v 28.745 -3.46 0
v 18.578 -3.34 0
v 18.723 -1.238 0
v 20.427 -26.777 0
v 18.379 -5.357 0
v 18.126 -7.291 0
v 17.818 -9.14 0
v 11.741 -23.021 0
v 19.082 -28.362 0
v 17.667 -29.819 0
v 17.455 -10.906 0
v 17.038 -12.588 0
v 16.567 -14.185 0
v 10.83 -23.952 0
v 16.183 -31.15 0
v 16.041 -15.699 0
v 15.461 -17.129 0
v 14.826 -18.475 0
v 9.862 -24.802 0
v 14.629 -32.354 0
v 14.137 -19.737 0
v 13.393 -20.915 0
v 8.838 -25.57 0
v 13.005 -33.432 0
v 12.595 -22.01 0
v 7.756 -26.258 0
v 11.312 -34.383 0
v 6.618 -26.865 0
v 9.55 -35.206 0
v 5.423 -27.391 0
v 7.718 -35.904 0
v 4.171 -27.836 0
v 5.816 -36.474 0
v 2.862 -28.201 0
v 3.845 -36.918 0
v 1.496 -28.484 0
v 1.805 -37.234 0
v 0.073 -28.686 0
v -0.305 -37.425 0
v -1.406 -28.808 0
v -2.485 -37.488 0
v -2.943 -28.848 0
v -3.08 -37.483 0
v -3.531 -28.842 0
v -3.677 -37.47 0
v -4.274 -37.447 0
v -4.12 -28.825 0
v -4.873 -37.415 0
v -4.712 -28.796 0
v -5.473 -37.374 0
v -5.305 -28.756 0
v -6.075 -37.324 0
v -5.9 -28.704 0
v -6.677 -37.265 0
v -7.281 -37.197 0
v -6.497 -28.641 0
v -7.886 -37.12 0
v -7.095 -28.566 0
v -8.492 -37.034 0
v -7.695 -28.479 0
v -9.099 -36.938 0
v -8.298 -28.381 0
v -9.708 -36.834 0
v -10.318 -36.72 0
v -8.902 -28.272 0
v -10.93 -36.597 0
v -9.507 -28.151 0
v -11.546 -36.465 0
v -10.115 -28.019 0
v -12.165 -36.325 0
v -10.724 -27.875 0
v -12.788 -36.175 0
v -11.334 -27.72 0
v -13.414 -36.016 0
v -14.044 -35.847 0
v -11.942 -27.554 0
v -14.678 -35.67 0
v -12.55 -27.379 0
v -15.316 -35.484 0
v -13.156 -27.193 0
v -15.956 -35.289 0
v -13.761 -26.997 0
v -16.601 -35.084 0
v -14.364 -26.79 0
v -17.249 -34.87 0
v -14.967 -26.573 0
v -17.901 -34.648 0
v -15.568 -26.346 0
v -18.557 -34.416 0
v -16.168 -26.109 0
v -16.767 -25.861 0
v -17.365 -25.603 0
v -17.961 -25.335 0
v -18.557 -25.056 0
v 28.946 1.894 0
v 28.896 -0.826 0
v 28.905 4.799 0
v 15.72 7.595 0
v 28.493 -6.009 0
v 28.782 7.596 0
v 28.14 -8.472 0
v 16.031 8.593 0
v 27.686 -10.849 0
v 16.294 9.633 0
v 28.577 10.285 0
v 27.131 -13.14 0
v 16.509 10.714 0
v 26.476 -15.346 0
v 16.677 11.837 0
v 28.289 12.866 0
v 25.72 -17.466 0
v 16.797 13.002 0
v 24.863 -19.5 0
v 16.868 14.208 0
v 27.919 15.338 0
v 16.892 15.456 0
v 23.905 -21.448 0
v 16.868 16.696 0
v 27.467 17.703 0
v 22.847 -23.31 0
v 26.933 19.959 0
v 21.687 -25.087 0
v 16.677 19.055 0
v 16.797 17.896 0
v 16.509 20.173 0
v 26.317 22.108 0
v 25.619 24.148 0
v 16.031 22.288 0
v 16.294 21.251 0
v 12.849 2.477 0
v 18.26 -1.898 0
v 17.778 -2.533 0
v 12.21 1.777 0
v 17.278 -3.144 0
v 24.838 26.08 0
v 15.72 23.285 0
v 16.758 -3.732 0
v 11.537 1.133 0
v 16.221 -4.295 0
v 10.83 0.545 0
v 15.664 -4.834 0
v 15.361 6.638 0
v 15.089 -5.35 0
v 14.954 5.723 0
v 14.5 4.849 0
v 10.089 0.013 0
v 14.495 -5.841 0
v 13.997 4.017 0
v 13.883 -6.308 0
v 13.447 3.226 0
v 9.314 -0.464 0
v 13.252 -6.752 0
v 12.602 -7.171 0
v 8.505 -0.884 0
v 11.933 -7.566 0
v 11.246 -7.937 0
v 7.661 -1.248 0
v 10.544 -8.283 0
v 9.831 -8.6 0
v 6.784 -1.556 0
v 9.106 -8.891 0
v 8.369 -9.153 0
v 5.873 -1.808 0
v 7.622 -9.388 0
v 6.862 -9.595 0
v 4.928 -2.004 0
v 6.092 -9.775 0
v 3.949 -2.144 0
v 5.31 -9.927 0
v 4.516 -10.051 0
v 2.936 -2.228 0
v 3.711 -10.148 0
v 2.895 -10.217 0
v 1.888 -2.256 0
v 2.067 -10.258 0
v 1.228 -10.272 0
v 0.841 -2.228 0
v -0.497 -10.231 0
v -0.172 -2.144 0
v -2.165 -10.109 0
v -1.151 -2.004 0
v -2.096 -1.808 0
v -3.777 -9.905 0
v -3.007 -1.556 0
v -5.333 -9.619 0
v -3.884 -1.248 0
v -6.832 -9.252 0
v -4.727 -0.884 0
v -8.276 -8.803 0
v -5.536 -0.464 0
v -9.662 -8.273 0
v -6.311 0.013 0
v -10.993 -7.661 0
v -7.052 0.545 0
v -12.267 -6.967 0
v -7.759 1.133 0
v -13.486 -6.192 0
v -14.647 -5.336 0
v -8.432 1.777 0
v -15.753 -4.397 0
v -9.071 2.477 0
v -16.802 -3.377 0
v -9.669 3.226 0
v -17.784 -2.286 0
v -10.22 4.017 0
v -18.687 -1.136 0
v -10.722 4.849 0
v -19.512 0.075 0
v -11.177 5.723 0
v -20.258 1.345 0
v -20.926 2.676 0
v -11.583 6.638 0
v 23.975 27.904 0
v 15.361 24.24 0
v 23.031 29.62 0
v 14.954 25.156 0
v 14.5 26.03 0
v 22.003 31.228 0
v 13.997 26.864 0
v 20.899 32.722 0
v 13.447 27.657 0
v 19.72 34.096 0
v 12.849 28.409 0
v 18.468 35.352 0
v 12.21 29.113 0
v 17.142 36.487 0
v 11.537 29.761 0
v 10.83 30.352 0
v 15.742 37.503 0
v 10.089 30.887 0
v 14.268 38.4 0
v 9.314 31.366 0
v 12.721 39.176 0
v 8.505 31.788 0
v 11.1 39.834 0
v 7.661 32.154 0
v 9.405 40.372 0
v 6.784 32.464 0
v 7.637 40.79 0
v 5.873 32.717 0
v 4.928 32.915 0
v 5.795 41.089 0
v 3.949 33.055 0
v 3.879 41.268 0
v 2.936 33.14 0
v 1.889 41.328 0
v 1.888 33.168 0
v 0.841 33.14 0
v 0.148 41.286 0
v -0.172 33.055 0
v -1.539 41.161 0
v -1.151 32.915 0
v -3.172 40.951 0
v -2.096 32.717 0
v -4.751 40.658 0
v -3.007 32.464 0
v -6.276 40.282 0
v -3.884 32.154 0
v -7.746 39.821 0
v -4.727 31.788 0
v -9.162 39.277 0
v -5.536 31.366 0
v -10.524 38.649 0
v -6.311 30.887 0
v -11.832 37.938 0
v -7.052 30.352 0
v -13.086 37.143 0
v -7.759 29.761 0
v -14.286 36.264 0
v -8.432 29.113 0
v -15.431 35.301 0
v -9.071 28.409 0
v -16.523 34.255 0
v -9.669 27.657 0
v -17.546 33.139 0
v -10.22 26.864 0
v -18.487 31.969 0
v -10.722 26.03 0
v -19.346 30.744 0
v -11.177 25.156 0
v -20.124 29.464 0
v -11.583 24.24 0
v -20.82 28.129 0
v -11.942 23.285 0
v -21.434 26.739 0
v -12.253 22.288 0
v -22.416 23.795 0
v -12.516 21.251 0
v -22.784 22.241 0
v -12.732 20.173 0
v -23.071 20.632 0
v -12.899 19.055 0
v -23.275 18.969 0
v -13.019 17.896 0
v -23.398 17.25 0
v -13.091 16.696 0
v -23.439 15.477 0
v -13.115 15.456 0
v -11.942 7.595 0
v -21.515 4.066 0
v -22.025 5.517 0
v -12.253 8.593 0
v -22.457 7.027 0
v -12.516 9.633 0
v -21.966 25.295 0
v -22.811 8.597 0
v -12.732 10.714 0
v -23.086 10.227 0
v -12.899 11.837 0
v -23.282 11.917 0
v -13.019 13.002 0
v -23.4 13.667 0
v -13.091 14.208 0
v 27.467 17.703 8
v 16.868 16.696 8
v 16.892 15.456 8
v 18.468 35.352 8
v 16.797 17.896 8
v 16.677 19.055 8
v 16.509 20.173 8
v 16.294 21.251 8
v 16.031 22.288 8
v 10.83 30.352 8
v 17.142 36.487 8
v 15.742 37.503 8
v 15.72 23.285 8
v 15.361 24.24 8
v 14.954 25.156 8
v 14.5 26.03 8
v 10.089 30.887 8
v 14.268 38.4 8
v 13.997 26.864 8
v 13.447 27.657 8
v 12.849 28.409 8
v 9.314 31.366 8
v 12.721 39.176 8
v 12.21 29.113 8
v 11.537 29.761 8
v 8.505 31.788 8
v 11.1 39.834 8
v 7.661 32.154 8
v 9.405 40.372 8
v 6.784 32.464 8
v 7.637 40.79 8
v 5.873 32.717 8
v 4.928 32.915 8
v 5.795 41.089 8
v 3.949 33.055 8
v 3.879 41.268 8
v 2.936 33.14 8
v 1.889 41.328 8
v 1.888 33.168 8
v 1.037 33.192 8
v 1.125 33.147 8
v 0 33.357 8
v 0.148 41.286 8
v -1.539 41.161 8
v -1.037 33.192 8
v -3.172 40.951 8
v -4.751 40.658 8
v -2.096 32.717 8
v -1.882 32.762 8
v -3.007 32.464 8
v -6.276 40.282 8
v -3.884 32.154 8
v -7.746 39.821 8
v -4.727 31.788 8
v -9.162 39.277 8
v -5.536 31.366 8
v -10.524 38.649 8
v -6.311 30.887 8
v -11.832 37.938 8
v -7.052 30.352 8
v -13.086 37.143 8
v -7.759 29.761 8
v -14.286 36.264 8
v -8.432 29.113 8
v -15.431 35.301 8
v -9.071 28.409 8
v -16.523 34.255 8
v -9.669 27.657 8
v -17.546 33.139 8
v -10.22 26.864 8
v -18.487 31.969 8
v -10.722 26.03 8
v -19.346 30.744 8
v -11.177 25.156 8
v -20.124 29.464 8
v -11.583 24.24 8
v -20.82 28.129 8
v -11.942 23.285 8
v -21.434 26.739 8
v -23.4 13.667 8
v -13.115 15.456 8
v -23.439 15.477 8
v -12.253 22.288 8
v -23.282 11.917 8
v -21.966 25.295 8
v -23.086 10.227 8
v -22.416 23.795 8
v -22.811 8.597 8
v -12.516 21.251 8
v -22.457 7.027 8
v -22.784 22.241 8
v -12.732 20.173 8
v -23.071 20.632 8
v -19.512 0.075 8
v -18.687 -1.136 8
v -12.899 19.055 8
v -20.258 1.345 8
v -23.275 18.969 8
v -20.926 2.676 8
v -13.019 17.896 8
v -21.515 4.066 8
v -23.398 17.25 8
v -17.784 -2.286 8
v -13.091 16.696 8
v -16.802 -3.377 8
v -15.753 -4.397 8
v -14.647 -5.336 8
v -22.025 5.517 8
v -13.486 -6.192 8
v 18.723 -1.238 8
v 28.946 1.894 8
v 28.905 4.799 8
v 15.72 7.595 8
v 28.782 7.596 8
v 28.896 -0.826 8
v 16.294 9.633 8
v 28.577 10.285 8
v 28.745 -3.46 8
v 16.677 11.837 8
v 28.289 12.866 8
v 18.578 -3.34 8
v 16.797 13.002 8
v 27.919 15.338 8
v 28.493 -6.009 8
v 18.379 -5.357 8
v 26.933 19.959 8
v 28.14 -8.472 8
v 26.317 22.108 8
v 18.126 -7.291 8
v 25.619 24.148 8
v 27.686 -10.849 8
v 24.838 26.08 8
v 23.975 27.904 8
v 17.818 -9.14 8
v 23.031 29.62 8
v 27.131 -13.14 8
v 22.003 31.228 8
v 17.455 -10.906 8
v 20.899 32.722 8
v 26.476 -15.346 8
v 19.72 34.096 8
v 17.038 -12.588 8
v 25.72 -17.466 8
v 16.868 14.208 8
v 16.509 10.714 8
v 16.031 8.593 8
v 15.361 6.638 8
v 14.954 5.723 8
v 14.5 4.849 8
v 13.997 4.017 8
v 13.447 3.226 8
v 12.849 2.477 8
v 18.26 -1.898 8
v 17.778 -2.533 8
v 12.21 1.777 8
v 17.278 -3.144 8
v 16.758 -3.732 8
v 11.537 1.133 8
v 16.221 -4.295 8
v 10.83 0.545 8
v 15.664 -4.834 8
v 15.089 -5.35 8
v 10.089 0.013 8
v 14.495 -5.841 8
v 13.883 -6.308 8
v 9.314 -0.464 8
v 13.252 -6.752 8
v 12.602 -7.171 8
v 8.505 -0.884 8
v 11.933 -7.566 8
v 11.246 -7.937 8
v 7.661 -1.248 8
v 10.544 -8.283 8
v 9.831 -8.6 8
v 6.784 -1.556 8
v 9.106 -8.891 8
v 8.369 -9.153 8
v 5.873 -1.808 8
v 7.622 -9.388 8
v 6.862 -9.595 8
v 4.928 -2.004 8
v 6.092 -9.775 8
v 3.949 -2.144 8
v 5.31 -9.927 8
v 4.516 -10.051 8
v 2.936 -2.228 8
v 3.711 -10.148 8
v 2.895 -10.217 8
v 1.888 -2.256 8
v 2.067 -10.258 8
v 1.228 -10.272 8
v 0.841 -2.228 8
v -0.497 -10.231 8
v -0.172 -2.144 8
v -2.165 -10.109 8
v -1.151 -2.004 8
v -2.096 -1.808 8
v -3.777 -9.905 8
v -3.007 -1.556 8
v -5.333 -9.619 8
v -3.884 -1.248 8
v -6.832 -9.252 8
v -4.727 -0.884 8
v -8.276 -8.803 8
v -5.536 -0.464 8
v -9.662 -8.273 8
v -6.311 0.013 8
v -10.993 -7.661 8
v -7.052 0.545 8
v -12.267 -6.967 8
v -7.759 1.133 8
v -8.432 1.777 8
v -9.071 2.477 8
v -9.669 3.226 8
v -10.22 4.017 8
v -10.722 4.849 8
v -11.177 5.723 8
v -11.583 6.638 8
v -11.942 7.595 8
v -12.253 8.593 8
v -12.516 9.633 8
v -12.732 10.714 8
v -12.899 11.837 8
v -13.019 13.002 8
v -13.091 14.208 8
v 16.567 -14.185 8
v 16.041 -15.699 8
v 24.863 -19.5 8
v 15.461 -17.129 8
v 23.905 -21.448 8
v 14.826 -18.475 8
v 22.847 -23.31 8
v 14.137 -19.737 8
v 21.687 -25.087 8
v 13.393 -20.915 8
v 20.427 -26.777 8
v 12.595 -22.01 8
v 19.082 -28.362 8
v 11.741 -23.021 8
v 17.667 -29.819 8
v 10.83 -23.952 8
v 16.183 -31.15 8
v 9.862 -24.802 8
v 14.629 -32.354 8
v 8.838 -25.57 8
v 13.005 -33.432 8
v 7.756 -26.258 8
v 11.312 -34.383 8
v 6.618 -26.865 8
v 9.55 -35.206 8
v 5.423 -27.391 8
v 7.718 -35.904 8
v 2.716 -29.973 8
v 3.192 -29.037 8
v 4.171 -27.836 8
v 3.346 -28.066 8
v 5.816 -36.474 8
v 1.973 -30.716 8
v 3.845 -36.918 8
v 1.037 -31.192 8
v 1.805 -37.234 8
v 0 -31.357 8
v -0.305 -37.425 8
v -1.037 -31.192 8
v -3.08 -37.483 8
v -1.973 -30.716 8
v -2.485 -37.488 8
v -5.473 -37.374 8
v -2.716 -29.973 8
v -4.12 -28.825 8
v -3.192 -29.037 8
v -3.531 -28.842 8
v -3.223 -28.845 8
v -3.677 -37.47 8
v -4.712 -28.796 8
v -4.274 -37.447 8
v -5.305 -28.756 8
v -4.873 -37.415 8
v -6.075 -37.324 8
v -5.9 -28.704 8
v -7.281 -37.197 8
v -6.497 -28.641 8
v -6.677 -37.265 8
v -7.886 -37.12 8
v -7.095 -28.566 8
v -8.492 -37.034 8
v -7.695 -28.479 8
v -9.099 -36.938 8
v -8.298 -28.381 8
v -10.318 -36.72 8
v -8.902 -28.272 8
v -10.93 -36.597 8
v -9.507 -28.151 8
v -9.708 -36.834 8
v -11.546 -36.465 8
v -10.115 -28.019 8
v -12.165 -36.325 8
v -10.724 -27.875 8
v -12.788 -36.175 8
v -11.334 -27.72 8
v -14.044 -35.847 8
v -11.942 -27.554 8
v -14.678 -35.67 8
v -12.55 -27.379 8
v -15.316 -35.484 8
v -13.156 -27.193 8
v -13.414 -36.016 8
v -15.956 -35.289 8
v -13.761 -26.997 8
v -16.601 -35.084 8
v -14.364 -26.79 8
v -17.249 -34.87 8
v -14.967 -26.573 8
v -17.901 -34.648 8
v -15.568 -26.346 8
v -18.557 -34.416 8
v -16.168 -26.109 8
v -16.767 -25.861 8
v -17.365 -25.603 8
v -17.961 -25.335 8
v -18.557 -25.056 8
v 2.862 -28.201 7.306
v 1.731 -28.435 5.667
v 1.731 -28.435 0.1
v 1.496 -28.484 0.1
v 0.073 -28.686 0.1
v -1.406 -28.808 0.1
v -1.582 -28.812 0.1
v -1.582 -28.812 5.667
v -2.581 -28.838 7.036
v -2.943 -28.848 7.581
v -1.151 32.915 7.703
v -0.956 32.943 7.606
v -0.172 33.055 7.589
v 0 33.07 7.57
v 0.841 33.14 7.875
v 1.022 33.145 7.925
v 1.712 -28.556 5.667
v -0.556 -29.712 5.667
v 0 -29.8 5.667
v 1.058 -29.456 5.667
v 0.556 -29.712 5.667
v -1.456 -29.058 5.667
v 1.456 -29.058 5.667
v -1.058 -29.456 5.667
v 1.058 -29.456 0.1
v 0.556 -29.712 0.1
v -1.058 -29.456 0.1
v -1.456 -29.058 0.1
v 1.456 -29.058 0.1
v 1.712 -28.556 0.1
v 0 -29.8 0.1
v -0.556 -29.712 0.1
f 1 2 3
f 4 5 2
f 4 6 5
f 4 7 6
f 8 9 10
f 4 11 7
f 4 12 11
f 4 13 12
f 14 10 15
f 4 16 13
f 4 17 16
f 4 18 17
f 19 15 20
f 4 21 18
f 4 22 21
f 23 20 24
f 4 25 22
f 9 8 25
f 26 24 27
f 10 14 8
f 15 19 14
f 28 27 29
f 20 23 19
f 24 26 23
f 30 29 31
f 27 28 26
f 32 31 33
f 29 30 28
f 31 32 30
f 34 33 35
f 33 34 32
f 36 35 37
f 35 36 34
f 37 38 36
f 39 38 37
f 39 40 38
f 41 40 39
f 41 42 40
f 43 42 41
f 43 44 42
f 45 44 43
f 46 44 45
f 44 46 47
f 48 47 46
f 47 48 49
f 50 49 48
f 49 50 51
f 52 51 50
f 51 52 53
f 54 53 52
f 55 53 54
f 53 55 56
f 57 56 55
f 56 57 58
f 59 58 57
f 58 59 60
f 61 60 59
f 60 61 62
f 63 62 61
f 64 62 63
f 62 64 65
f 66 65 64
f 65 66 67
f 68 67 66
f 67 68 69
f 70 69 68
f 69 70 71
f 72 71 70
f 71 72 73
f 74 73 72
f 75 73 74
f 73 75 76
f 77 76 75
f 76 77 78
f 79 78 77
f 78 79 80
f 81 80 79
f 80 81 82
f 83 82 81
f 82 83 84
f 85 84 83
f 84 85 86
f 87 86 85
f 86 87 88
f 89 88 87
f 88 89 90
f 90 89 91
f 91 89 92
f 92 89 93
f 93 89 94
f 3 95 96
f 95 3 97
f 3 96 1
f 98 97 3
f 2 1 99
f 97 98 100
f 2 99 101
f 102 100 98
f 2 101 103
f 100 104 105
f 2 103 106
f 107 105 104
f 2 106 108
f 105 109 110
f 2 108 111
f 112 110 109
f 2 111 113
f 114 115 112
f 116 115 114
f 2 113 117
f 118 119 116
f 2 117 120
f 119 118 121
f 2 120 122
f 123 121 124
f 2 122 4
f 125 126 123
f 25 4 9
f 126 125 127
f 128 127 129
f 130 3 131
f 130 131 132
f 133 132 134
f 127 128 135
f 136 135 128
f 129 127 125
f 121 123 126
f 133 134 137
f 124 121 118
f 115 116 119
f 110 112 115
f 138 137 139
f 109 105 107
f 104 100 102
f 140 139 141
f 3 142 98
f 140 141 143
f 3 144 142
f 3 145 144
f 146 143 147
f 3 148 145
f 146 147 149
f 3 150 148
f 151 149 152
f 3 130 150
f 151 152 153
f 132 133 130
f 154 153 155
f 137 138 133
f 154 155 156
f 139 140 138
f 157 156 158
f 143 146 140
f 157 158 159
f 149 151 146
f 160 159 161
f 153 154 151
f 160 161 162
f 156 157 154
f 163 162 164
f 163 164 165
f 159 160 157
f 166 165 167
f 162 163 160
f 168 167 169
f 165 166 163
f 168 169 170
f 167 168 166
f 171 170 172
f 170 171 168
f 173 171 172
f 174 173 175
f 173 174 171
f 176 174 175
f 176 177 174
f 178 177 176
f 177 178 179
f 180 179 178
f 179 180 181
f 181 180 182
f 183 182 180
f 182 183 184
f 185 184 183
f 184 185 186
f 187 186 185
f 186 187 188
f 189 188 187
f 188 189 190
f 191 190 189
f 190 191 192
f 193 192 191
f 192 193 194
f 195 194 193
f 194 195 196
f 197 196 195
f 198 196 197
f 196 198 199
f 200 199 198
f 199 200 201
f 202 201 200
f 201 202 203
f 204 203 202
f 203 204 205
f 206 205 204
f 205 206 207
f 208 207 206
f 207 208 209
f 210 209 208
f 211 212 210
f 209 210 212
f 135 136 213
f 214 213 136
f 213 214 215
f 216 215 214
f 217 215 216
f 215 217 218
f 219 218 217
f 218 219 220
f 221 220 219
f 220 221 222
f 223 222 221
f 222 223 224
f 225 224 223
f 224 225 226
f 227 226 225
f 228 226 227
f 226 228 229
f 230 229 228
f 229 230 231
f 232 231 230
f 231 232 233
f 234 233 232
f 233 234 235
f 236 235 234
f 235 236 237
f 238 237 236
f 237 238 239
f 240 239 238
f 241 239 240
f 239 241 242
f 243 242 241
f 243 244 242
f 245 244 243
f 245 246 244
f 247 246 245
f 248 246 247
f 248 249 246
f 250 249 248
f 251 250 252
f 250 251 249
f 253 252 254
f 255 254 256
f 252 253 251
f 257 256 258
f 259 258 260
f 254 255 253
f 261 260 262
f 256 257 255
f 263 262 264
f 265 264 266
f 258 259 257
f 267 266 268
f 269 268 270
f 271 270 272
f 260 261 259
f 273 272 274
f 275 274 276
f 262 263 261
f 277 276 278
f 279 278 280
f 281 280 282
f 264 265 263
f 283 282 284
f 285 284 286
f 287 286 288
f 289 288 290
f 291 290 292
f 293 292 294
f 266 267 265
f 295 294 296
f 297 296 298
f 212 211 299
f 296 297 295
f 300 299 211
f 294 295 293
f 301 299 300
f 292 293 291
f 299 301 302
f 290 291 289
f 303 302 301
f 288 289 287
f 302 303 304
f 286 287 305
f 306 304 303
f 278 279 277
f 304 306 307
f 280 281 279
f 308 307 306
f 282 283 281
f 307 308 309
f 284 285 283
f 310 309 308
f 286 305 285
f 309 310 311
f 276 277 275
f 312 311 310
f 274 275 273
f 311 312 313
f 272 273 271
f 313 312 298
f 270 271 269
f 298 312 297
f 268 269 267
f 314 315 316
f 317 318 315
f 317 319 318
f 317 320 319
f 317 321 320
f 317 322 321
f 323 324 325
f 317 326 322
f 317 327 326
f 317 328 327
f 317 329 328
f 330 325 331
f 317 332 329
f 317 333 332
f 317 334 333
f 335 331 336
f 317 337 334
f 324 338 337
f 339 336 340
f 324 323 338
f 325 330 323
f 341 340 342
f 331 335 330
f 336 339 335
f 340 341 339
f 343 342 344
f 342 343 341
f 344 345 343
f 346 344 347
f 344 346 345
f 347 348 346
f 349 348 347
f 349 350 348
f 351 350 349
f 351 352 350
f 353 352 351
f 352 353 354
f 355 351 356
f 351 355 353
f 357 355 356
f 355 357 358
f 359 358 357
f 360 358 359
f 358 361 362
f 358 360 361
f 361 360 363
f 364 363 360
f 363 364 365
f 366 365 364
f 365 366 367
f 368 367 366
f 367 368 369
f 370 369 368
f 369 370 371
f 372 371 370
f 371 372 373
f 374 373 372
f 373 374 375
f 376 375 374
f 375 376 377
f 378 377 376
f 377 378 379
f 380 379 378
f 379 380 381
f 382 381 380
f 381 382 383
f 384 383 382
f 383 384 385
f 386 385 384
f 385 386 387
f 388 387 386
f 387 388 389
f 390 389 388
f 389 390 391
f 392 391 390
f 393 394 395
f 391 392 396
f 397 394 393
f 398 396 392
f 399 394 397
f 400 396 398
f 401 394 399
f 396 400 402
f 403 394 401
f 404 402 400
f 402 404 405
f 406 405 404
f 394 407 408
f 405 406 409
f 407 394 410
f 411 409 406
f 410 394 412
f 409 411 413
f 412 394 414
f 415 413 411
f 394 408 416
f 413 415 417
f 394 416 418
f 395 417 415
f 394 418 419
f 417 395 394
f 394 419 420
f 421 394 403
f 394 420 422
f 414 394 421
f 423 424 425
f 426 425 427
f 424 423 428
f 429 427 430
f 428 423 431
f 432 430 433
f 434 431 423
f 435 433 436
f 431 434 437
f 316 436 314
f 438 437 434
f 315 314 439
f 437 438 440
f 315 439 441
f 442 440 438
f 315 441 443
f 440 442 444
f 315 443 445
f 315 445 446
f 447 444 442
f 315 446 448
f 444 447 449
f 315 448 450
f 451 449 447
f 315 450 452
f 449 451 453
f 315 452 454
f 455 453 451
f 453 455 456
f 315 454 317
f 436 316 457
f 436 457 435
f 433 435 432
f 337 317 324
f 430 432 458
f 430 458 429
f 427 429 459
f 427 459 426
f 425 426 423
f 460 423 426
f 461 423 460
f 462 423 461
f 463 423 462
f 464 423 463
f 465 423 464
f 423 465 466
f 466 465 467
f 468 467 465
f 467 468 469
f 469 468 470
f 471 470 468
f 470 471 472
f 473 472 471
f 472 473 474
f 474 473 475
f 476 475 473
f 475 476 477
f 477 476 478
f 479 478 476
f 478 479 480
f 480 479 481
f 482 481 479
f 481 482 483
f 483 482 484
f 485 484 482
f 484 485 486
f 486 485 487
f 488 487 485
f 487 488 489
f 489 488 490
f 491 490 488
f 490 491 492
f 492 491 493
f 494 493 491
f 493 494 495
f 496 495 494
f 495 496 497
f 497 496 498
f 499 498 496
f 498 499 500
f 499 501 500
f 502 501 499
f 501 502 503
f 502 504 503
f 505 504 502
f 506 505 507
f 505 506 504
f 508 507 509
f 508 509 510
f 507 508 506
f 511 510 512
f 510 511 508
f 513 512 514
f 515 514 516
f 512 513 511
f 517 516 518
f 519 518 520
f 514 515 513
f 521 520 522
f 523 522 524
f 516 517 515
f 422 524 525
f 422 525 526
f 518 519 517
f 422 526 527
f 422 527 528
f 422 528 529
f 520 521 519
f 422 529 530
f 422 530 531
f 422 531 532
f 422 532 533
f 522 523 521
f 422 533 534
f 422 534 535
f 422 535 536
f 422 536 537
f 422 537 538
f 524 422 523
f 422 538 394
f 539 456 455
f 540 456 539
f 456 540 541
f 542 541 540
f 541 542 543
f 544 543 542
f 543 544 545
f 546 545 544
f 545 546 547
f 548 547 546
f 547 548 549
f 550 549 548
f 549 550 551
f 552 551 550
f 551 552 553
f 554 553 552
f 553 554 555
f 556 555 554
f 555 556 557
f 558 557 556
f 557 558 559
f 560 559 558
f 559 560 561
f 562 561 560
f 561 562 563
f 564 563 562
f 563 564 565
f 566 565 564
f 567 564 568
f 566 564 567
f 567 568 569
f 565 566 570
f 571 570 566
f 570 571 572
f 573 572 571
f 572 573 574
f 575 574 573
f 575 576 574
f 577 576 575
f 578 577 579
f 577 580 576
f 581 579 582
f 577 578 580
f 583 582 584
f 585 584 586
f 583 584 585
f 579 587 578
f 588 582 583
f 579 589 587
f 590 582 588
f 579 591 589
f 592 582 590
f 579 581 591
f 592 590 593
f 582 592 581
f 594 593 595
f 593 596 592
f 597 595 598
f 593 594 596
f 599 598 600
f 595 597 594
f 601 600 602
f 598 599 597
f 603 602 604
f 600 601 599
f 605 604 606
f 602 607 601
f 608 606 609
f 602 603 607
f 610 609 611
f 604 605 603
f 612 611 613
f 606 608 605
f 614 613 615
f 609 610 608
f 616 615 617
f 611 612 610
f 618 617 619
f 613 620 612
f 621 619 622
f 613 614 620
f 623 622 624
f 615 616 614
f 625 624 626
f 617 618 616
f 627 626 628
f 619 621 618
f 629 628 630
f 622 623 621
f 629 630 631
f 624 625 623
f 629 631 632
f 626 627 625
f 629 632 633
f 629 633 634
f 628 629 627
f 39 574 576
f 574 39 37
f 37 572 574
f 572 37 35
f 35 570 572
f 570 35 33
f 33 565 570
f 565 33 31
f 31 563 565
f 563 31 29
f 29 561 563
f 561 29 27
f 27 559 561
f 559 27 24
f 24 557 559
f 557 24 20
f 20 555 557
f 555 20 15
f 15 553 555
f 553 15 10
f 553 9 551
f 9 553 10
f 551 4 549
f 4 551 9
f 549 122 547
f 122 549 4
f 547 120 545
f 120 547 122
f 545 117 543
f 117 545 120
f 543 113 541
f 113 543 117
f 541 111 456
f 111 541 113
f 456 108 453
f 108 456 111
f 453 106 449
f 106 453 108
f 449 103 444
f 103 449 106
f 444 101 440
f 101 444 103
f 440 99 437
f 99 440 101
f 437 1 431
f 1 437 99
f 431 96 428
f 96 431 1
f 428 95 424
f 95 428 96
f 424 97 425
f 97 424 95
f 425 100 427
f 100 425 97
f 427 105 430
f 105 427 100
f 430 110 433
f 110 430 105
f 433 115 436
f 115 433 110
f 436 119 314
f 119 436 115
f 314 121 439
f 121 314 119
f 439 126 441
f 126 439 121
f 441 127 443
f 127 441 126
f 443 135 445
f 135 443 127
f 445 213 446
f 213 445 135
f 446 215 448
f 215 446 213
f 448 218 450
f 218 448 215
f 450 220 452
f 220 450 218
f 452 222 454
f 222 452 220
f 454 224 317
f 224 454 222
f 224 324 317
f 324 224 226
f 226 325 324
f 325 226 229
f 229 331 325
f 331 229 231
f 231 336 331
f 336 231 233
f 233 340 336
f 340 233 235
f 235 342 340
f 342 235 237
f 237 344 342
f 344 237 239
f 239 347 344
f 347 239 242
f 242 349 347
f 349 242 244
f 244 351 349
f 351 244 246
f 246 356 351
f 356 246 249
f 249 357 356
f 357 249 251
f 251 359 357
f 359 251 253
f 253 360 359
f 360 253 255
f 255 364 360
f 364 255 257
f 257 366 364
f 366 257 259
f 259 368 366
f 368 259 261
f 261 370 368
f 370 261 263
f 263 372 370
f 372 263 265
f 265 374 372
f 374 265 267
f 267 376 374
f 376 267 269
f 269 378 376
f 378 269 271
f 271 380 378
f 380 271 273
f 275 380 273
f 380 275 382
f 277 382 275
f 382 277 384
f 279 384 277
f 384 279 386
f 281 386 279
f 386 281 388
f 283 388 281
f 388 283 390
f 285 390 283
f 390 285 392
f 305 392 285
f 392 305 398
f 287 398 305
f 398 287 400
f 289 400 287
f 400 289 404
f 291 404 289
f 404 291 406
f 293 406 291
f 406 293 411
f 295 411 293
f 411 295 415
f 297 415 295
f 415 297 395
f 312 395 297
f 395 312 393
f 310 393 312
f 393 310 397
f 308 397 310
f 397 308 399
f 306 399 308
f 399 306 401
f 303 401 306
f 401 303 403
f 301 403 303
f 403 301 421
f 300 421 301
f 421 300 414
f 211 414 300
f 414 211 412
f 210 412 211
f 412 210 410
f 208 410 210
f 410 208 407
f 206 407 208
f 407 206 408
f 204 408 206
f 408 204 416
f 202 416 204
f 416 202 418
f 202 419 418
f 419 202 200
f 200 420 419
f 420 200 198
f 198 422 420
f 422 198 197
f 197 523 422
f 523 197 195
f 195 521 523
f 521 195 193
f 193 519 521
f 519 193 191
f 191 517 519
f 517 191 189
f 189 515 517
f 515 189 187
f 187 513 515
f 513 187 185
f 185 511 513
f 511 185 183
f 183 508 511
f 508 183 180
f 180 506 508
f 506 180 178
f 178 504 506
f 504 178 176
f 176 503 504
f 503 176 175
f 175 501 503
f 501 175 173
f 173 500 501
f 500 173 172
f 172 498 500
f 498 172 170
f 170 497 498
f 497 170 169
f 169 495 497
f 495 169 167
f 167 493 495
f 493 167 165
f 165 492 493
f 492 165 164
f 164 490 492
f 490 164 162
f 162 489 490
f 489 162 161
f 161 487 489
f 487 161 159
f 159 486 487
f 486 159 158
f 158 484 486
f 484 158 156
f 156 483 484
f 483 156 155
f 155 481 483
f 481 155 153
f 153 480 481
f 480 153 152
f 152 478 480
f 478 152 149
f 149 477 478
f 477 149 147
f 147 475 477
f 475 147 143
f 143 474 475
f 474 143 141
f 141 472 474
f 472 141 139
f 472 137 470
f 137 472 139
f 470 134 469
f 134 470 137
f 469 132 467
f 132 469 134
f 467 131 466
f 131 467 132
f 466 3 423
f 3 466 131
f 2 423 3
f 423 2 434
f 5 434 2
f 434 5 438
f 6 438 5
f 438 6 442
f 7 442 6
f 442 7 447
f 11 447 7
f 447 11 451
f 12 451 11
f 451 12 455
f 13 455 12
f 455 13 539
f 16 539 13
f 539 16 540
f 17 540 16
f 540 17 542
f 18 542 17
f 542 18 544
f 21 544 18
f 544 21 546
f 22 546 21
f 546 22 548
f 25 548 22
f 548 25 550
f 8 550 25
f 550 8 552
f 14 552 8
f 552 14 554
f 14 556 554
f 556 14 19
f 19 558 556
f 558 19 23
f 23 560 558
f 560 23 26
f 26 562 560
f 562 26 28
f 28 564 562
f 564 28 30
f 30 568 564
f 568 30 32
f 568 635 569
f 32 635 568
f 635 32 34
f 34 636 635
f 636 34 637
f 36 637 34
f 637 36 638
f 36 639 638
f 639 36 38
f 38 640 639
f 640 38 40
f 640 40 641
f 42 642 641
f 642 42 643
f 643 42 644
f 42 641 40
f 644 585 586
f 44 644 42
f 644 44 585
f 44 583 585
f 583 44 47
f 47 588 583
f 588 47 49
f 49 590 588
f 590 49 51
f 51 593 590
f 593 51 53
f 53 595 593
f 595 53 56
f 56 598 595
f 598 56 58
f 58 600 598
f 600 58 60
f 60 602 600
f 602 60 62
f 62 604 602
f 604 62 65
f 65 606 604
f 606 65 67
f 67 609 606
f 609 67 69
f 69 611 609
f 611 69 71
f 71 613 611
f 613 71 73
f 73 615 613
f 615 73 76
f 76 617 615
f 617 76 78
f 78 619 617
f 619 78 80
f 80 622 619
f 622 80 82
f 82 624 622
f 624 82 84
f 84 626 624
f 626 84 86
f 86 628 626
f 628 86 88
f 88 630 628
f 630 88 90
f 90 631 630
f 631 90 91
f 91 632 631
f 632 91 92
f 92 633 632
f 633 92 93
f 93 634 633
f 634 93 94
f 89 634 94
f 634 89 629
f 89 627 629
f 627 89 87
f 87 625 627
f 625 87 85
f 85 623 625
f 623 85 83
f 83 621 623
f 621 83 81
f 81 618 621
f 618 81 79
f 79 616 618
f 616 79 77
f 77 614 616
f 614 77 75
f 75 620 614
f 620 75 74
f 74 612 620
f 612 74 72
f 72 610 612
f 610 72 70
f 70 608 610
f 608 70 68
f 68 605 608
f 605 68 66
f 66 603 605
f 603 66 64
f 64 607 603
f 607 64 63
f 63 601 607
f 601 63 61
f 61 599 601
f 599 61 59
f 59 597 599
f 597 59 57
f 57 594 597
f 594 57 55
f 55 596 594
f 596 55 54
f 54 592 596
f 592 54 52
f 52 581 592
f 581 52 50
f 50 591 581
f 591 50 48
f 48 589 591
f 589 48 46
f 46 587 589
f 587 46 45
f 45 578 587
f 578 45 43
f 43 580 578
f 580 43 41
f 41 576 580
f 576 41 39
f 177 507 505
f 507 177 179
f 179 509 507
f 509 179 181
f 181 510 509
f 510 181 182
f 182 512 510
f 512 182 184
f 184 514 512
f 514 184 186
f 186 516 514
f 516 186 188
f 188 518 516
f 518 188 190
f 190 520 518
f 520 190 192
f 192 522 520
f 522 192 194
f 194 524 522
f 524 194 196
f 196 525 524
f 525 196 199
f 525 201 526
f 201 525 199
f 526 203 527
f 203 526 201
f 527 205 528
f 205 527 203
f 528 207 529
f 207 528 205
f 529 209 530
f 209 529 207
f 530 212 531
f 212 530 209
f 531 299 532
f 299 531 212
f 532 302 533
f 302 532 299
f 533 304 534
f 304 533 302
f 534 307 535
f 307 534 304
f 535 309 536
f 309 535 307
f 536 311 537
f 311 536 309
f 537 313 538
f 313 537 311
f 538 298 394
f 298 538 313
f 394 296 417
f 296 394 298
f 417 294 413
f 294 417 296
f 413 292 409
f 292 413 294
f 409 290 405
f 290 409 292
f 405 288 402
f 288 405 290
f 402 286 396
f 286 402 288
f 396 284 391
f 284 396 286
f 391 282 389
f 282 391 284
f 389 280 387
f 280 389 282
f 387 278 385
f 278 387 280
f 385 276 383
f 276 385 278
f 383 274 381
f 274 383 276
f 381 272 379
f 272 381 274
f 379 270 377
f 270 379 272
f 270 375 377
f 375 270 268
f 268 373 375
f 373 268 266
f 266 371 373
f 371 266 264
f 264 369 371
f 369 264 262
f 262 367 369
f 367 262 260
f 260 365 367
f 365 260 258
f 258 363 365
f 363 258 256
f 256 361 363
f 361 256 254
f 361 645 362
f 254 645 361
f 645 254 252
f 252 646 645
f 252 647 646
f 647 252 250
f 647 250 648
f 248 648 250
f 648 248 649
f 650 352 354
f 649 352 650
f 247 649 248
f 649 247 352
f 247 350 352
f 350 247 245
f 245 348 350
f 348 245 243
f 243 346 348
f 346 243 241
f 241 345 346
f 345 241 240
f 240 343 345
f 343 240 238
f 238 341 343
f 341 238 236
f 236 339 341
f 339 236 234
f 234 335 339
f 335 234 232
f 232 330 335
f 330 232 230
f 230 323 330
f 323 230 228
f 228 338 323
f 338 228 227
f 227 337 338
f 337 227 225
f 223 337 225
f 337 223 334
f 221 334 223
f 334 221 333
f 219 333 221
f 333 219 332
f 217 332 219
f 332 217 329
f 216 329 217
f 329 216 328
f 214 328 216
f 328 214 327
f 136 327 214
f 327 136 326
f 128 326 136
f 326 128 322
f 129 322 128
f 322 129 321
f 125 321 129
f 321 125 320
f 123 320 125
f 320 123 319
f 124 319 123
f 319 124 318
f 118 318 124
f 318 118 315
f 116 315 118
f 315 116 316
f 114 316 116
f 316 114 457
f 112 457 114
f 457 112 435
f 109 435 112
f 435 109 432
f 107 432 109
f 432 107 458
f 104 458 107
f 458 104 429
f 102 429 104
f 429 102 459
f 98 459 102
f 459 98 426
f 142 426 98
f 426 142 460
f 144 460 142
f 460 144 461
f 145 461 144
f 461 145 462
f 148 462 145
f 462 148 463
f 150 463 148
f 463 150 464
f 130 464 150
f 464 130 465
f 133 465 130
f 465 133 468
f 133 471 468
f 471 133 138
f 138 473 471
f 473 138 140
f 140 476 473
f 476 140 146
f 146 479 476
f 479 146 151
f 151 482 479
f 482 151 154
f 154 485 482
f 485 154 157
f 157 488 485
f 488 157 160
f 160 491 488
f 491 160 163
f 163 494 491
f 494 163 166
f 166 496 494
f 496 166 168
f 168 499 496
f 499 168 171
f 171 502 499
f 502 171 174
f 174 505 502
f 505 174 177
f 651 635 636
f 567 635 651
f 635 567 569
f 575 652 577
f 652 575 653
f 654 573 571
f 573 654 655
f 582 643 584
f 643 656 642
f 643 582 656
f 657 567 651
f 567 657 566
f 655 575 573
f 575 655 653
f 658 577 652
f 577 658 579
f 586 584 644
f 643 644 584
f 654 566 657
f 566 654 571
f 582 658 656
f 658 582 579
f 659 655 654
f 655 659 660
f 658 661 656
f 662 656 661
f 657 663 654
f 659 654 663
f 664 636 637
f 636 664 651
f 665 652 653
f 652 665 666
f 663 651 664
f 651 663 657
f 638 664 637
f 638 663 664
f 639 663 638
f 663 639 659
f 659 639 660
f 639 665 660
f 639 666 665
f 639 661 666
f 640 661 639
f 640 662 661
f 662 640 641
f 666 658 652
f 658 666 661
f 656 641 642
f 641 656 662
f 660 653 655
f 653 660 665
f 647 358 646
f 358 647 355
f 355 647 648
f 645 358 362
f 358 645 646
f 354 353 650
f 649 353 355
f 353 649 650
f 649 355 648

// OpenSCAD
// Street Numbers for 3D printing
// Charles Tilford, 2019
// License: CC BY-NC-SA 4.0
//   https://creativecommons.org/licenses/by-nc-sa/4.0/

char="9";     // The number/letter to print

// Units are in mm, except for height of letter

// How many inches high should letter be?
inchesHigh=3;
// How thick/deep should letter be (mm)?
depth=8;

// Character coordinates just center the letter
charX=-30;    // Character X coord
charY=-36;    // Character Y coord
topScrew=30;  // Top screw Y coord
botScrew=-28; // Bottom screw Y coord
height=8;     // Thickness of character
// Screw dimensions. Default presumes
// #6 sheet metal screw
screwWid=3.6; // Width of screw shaft
screwTop=6.78;// Width of screw head
screwCon=5.08;// Height of head 'cone'

// Font to print in. Your system needs this
// installed, of course. If changed the hole
// positions almost certainly need to be
// changed, and maybe charX/charY.
fName="Open Sans Extrabold";
// https://fonts.google.com/specimen/Open+Sans
// Designer: Steve Matteson

// Thin floor below holes. My printer was
// struggling to have the hole 'border' stick
// to the stage. Just drill/screw thru it.
holeFloor=0.1; 

// ==========================================
// ===== All values below are auto-calculated
// ==========================================

// Scaled values
scaleFactor=inchesHigh / 3;
cX=charX * scaleFactor;
cY=charY * scaleFactor;
tS=topScrew * scaleFactor;
bS=botScrew * scaleFactor;
// Where do we start drawing screw head cone?
oS=depth - (screwCon-.05);

difference() {
  // We use difference() to punch out the screw holes
  // in the character
    
  // The character itself, 8mm thick
  translate([cX,cY,0])
    linear_extrude(height=depth, scale=1)
    text(char, size=(75*scaleFactor),
         $fn=100, font=fName);
    
  // Bottom screw hole
  translate([0,bS,oS]) color("red")
    cylinder(h=screwCon, d2=screwTop,
             d1=0, $fn=20);
   translate([0,bS,holeFloor])
    cylinder(h=20, d=screwWid, $fn=20);
    
  // Top screw hole
  translate([0,tS,oS]) color("red")
    cylinder(h=screwCon, d2=screwTop,
             d1=0, $fn=20);
  translate([0,tS,holeFloor])
    cylinder(h=20, d=screwWid, $fn=20);
}

// Colors are just to aid visualization of
// void spaces. $fn is "featuer number", ie how
// many polygons are devoted to object. The values
// above should be near your printing limit anyway.

// Developed in OpenSCAD
//    https://www.openscad.org/
